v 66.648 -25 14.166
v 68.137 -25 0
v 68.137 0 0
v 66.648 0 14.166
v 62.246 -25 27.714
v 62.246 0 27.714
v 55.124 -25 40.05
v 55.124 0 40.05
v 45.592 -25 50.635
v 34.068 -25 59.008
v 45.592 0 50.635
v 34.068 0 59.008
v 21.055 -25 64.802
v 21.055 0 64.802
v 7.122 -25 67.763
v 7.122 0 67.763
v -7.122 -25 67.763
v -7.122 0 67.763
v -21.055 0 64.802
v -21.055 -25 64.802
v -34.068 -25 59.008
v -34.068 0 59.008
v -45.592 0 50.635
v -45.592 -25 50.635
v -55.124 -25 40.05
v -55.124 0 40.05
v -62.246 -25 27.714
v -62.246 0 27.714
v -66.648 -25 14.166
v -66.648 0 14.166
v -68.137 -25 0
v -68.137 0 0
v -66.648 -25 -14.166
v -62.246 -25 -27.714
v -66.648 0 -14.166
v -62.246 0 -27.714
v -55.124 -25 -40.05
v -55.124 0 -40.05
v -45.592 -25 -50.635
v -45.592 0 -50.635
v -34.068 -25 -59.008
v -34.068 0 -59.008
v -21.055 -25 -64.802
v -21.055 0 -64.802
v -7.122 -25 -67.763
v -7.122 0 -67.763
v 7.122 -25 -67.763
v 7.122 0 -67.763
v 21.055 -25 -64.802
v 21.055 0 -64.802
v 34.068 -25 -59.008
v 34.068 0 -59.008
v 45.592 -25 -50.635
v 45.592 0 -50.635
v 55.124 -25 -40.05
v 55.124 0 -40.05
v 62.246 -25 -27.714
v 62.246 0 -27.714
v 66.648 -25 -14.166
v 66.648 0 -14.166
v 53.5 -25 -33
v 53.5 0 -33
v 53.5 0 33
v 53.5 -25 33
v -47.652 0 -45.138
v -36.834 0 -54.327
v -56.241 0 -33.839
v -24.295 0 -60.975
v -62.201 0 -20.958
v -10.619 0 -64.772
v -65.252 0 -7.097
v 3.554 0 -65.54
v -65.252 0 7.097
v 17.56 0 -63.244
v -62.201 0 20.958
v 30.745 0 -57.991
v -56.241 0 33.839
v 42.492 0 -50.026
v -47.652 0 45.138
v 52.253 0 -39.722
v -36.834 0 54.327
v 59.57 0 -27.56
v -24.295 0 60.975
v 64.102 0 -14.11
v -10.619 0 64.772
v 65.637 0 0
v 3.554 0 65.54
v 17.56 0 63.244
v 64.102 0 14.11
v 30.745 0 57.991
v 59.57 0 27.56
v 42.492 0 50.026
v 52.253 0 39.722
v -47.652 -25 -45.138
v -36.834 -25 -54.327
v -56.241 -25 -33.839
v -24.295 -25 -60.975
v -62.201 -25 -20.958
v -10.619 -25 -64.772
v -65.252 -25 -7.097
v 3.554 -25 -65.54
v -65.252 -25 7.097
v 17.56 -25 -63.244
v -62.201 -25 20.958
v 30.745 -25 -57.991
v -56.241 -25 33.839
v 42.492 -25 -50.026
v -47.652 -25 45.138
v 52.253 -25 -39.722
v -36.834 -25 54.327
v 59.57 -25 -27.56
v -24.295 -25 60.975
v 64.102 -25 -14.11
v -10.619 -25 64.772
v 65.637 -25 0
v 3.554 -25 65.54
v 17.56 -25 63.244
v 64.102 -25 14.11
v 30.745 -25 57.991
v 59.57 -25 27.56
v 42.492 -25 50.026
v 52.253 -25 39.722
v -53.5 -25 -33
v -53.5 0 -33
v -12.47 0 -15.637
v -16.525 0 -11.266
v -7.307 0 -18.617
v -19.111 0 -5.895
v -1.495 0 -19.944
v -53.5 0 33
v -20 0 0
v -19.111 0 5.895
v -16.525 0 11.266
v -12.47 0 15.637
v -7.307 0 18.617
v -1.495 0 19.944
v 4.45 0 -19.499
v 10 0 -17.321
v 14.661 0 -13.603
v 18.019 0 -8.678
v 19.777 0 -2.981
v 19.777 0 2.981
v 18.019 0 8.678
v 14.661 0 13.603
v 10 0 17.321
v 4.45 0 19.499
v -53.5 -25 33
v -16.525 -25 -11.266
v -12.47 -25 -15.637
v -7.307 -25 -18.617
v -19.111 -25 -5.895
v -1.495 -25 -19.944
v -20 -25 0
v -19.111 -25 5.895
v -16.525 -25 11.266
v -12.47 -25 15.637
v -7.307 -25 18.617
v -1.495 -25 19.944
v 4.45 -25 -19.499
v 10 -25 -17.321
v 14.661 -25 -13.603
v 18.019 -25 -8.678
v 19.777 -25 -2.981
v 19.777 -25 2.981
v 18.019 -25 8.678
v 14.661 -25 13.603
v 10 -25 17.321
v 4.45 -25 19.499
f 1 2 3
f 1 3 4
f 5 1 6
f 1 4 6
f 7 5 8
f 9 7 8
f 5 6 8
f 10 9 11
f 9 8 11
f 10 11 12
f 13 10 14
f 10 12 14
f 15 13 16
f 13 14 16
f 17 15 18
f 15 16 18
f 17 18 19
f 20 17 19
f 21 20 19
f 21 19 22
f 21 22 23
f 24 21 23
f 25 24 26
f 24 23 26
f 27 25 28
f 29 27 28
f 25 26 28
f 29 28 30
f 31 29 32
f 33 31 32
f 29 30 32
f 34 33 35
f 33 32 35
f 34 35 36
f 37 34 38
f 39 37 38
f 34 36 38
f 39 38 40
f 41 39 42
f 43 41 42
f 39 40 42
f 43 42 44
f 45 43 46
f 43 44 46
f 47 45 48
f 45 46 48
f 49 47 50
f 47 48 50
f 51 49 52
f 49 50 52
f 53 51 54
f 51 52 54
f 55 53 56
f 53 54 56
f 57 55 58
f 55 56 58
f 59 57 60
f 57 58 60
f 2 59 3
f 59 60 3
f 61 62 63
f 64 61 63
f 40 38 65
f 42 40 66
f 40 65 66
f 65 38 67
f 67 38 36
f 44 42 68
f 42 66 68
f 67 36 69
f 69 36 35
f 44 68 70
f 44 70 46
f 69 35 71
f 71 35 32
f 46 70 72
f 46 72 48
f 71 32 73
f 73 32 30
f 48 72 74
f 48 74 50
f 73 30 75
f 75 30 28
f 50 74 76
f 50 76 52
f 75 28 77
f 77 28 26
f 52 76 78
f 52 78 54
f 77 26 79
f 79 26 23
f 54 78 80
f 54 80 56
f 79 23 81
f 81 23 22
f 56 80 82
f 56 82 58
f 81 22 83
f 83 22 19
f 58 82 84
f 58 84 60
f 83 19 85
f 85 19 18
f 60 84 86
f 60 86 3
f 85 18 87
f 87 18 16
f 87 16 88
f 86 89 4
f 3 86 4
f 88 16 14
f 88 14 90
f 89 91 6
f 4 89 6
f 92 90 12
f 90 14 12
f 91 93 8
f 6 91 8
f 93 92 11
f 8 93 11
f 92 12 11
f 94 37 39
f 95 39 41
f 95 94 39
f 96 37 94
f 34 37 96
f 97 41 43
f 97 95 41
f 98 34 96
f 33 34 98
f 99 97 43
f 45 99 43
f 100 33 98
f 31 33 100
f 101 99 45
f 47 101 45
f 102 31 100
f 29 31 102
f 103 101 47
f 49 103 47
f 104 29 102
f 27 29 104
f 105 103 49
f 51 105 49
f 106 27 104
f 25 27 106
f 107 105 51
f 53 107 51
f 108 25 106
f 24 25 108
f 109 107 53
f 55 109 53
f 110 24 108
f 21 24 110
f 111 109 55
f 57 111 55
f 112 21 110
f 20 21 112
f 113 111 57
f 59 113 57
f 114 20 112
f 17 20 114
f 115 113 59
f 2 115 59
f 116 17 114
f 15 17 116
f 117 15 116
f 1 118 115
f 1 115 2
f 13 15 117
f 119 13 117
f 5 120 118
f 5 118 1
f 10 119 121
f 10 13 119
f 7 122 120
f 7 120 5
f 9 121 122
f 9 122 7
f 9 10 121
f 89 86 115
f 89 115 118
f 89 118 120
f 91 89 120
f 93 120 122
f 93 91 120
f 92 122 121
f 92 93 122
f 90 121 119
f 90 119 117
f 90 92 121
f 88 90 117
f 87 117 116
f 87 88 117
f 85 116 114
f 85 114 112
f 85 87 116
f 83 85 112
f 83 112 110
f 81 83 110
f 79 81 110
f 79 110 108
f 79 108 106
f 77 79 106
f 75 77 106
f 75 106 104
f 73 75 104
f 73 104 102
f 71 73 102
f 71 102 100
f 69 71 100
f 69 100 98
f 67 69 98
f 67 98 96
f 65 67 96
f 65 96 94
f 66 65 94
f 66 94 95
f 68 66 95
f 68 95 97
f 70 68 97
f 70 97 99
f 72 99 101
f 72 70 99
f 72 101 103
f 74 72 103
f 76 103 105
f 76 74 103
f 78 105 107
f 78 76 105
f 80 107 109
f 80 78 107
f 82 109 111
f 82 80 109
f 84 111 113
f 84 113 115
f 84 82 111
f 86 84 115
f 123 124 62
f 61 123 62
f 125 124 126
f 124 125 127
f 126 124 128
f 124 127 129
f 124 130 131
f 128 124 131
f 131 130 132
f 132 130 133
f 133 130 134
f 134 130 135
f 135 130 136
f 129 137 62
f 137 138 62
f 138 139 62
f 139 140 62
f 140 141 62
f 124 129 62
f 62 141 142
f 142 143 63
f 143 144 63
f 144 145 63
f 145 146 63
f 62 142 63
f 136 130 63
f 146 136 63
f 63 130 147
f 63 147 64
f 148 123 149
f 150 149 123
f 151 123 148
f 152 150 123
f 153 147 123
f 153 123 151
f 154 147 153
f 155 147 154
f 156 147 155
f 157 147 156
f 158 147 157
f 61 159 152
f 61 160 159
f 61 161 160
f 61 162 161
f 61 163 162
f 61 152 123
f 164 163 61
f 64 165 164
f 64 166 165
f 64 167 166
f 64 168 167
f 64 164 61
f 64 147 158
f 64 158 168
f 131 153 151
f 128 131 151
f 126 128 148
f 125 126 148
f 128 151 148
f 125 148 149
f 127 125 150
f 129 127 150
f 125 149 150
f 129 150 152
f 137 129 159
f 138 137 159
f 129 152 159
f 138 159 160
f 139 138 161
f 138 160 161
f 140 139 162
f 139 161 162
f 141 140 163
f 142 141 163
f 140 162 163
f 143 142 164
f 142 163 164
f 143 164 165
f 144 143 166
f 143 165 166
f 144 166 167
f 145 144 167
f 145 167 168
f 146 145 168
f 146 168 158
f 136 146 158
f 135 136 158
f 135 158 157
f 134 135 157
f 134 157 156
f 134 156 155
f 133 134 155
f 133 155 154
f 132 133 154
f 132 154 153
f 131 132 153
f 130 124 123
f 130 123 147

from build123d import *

# Parameters (mm, degrees)
F0_R     = 68.136749
F1_DEPTH = 25
F2_T     = -2.5
F3_W     = 107
F3_H     = 66
F4_DEPTH = 25
F6_D     = 40


with BuildPart() as f1:
    # F0 (on Front) → F1 (new body)
    with BuildSketch(Plane.XZ):
        Circle(F0_R)
    extrude(amount=F1_DEPTH)

    # F2
    f2_openings = [f1.faces().sort_by_distance(p)[0] for p in [
        (0, -25, 0),
        (0, 0, 0),
    ]]
    offset(amount=F2_T, openings=f2_openings)


with BuildPart() as f4:
    # F3 (on Front) → F4 (new body)
    with BuildSketch(Plane.XZ):
        Rectangle(F3_W, F3_H)
    extrude(amount=F4_DEPTH)

    # F6 (through all)
    with Locations(Plane(origin=(0, 0, 0), x_dir=(1, 0, 0), z_dir=(0, 1, 0))):
        with Locations((0, 0)):
            Hole(F6_D / 2)


solid = Compound([f1.part, f4.part])
